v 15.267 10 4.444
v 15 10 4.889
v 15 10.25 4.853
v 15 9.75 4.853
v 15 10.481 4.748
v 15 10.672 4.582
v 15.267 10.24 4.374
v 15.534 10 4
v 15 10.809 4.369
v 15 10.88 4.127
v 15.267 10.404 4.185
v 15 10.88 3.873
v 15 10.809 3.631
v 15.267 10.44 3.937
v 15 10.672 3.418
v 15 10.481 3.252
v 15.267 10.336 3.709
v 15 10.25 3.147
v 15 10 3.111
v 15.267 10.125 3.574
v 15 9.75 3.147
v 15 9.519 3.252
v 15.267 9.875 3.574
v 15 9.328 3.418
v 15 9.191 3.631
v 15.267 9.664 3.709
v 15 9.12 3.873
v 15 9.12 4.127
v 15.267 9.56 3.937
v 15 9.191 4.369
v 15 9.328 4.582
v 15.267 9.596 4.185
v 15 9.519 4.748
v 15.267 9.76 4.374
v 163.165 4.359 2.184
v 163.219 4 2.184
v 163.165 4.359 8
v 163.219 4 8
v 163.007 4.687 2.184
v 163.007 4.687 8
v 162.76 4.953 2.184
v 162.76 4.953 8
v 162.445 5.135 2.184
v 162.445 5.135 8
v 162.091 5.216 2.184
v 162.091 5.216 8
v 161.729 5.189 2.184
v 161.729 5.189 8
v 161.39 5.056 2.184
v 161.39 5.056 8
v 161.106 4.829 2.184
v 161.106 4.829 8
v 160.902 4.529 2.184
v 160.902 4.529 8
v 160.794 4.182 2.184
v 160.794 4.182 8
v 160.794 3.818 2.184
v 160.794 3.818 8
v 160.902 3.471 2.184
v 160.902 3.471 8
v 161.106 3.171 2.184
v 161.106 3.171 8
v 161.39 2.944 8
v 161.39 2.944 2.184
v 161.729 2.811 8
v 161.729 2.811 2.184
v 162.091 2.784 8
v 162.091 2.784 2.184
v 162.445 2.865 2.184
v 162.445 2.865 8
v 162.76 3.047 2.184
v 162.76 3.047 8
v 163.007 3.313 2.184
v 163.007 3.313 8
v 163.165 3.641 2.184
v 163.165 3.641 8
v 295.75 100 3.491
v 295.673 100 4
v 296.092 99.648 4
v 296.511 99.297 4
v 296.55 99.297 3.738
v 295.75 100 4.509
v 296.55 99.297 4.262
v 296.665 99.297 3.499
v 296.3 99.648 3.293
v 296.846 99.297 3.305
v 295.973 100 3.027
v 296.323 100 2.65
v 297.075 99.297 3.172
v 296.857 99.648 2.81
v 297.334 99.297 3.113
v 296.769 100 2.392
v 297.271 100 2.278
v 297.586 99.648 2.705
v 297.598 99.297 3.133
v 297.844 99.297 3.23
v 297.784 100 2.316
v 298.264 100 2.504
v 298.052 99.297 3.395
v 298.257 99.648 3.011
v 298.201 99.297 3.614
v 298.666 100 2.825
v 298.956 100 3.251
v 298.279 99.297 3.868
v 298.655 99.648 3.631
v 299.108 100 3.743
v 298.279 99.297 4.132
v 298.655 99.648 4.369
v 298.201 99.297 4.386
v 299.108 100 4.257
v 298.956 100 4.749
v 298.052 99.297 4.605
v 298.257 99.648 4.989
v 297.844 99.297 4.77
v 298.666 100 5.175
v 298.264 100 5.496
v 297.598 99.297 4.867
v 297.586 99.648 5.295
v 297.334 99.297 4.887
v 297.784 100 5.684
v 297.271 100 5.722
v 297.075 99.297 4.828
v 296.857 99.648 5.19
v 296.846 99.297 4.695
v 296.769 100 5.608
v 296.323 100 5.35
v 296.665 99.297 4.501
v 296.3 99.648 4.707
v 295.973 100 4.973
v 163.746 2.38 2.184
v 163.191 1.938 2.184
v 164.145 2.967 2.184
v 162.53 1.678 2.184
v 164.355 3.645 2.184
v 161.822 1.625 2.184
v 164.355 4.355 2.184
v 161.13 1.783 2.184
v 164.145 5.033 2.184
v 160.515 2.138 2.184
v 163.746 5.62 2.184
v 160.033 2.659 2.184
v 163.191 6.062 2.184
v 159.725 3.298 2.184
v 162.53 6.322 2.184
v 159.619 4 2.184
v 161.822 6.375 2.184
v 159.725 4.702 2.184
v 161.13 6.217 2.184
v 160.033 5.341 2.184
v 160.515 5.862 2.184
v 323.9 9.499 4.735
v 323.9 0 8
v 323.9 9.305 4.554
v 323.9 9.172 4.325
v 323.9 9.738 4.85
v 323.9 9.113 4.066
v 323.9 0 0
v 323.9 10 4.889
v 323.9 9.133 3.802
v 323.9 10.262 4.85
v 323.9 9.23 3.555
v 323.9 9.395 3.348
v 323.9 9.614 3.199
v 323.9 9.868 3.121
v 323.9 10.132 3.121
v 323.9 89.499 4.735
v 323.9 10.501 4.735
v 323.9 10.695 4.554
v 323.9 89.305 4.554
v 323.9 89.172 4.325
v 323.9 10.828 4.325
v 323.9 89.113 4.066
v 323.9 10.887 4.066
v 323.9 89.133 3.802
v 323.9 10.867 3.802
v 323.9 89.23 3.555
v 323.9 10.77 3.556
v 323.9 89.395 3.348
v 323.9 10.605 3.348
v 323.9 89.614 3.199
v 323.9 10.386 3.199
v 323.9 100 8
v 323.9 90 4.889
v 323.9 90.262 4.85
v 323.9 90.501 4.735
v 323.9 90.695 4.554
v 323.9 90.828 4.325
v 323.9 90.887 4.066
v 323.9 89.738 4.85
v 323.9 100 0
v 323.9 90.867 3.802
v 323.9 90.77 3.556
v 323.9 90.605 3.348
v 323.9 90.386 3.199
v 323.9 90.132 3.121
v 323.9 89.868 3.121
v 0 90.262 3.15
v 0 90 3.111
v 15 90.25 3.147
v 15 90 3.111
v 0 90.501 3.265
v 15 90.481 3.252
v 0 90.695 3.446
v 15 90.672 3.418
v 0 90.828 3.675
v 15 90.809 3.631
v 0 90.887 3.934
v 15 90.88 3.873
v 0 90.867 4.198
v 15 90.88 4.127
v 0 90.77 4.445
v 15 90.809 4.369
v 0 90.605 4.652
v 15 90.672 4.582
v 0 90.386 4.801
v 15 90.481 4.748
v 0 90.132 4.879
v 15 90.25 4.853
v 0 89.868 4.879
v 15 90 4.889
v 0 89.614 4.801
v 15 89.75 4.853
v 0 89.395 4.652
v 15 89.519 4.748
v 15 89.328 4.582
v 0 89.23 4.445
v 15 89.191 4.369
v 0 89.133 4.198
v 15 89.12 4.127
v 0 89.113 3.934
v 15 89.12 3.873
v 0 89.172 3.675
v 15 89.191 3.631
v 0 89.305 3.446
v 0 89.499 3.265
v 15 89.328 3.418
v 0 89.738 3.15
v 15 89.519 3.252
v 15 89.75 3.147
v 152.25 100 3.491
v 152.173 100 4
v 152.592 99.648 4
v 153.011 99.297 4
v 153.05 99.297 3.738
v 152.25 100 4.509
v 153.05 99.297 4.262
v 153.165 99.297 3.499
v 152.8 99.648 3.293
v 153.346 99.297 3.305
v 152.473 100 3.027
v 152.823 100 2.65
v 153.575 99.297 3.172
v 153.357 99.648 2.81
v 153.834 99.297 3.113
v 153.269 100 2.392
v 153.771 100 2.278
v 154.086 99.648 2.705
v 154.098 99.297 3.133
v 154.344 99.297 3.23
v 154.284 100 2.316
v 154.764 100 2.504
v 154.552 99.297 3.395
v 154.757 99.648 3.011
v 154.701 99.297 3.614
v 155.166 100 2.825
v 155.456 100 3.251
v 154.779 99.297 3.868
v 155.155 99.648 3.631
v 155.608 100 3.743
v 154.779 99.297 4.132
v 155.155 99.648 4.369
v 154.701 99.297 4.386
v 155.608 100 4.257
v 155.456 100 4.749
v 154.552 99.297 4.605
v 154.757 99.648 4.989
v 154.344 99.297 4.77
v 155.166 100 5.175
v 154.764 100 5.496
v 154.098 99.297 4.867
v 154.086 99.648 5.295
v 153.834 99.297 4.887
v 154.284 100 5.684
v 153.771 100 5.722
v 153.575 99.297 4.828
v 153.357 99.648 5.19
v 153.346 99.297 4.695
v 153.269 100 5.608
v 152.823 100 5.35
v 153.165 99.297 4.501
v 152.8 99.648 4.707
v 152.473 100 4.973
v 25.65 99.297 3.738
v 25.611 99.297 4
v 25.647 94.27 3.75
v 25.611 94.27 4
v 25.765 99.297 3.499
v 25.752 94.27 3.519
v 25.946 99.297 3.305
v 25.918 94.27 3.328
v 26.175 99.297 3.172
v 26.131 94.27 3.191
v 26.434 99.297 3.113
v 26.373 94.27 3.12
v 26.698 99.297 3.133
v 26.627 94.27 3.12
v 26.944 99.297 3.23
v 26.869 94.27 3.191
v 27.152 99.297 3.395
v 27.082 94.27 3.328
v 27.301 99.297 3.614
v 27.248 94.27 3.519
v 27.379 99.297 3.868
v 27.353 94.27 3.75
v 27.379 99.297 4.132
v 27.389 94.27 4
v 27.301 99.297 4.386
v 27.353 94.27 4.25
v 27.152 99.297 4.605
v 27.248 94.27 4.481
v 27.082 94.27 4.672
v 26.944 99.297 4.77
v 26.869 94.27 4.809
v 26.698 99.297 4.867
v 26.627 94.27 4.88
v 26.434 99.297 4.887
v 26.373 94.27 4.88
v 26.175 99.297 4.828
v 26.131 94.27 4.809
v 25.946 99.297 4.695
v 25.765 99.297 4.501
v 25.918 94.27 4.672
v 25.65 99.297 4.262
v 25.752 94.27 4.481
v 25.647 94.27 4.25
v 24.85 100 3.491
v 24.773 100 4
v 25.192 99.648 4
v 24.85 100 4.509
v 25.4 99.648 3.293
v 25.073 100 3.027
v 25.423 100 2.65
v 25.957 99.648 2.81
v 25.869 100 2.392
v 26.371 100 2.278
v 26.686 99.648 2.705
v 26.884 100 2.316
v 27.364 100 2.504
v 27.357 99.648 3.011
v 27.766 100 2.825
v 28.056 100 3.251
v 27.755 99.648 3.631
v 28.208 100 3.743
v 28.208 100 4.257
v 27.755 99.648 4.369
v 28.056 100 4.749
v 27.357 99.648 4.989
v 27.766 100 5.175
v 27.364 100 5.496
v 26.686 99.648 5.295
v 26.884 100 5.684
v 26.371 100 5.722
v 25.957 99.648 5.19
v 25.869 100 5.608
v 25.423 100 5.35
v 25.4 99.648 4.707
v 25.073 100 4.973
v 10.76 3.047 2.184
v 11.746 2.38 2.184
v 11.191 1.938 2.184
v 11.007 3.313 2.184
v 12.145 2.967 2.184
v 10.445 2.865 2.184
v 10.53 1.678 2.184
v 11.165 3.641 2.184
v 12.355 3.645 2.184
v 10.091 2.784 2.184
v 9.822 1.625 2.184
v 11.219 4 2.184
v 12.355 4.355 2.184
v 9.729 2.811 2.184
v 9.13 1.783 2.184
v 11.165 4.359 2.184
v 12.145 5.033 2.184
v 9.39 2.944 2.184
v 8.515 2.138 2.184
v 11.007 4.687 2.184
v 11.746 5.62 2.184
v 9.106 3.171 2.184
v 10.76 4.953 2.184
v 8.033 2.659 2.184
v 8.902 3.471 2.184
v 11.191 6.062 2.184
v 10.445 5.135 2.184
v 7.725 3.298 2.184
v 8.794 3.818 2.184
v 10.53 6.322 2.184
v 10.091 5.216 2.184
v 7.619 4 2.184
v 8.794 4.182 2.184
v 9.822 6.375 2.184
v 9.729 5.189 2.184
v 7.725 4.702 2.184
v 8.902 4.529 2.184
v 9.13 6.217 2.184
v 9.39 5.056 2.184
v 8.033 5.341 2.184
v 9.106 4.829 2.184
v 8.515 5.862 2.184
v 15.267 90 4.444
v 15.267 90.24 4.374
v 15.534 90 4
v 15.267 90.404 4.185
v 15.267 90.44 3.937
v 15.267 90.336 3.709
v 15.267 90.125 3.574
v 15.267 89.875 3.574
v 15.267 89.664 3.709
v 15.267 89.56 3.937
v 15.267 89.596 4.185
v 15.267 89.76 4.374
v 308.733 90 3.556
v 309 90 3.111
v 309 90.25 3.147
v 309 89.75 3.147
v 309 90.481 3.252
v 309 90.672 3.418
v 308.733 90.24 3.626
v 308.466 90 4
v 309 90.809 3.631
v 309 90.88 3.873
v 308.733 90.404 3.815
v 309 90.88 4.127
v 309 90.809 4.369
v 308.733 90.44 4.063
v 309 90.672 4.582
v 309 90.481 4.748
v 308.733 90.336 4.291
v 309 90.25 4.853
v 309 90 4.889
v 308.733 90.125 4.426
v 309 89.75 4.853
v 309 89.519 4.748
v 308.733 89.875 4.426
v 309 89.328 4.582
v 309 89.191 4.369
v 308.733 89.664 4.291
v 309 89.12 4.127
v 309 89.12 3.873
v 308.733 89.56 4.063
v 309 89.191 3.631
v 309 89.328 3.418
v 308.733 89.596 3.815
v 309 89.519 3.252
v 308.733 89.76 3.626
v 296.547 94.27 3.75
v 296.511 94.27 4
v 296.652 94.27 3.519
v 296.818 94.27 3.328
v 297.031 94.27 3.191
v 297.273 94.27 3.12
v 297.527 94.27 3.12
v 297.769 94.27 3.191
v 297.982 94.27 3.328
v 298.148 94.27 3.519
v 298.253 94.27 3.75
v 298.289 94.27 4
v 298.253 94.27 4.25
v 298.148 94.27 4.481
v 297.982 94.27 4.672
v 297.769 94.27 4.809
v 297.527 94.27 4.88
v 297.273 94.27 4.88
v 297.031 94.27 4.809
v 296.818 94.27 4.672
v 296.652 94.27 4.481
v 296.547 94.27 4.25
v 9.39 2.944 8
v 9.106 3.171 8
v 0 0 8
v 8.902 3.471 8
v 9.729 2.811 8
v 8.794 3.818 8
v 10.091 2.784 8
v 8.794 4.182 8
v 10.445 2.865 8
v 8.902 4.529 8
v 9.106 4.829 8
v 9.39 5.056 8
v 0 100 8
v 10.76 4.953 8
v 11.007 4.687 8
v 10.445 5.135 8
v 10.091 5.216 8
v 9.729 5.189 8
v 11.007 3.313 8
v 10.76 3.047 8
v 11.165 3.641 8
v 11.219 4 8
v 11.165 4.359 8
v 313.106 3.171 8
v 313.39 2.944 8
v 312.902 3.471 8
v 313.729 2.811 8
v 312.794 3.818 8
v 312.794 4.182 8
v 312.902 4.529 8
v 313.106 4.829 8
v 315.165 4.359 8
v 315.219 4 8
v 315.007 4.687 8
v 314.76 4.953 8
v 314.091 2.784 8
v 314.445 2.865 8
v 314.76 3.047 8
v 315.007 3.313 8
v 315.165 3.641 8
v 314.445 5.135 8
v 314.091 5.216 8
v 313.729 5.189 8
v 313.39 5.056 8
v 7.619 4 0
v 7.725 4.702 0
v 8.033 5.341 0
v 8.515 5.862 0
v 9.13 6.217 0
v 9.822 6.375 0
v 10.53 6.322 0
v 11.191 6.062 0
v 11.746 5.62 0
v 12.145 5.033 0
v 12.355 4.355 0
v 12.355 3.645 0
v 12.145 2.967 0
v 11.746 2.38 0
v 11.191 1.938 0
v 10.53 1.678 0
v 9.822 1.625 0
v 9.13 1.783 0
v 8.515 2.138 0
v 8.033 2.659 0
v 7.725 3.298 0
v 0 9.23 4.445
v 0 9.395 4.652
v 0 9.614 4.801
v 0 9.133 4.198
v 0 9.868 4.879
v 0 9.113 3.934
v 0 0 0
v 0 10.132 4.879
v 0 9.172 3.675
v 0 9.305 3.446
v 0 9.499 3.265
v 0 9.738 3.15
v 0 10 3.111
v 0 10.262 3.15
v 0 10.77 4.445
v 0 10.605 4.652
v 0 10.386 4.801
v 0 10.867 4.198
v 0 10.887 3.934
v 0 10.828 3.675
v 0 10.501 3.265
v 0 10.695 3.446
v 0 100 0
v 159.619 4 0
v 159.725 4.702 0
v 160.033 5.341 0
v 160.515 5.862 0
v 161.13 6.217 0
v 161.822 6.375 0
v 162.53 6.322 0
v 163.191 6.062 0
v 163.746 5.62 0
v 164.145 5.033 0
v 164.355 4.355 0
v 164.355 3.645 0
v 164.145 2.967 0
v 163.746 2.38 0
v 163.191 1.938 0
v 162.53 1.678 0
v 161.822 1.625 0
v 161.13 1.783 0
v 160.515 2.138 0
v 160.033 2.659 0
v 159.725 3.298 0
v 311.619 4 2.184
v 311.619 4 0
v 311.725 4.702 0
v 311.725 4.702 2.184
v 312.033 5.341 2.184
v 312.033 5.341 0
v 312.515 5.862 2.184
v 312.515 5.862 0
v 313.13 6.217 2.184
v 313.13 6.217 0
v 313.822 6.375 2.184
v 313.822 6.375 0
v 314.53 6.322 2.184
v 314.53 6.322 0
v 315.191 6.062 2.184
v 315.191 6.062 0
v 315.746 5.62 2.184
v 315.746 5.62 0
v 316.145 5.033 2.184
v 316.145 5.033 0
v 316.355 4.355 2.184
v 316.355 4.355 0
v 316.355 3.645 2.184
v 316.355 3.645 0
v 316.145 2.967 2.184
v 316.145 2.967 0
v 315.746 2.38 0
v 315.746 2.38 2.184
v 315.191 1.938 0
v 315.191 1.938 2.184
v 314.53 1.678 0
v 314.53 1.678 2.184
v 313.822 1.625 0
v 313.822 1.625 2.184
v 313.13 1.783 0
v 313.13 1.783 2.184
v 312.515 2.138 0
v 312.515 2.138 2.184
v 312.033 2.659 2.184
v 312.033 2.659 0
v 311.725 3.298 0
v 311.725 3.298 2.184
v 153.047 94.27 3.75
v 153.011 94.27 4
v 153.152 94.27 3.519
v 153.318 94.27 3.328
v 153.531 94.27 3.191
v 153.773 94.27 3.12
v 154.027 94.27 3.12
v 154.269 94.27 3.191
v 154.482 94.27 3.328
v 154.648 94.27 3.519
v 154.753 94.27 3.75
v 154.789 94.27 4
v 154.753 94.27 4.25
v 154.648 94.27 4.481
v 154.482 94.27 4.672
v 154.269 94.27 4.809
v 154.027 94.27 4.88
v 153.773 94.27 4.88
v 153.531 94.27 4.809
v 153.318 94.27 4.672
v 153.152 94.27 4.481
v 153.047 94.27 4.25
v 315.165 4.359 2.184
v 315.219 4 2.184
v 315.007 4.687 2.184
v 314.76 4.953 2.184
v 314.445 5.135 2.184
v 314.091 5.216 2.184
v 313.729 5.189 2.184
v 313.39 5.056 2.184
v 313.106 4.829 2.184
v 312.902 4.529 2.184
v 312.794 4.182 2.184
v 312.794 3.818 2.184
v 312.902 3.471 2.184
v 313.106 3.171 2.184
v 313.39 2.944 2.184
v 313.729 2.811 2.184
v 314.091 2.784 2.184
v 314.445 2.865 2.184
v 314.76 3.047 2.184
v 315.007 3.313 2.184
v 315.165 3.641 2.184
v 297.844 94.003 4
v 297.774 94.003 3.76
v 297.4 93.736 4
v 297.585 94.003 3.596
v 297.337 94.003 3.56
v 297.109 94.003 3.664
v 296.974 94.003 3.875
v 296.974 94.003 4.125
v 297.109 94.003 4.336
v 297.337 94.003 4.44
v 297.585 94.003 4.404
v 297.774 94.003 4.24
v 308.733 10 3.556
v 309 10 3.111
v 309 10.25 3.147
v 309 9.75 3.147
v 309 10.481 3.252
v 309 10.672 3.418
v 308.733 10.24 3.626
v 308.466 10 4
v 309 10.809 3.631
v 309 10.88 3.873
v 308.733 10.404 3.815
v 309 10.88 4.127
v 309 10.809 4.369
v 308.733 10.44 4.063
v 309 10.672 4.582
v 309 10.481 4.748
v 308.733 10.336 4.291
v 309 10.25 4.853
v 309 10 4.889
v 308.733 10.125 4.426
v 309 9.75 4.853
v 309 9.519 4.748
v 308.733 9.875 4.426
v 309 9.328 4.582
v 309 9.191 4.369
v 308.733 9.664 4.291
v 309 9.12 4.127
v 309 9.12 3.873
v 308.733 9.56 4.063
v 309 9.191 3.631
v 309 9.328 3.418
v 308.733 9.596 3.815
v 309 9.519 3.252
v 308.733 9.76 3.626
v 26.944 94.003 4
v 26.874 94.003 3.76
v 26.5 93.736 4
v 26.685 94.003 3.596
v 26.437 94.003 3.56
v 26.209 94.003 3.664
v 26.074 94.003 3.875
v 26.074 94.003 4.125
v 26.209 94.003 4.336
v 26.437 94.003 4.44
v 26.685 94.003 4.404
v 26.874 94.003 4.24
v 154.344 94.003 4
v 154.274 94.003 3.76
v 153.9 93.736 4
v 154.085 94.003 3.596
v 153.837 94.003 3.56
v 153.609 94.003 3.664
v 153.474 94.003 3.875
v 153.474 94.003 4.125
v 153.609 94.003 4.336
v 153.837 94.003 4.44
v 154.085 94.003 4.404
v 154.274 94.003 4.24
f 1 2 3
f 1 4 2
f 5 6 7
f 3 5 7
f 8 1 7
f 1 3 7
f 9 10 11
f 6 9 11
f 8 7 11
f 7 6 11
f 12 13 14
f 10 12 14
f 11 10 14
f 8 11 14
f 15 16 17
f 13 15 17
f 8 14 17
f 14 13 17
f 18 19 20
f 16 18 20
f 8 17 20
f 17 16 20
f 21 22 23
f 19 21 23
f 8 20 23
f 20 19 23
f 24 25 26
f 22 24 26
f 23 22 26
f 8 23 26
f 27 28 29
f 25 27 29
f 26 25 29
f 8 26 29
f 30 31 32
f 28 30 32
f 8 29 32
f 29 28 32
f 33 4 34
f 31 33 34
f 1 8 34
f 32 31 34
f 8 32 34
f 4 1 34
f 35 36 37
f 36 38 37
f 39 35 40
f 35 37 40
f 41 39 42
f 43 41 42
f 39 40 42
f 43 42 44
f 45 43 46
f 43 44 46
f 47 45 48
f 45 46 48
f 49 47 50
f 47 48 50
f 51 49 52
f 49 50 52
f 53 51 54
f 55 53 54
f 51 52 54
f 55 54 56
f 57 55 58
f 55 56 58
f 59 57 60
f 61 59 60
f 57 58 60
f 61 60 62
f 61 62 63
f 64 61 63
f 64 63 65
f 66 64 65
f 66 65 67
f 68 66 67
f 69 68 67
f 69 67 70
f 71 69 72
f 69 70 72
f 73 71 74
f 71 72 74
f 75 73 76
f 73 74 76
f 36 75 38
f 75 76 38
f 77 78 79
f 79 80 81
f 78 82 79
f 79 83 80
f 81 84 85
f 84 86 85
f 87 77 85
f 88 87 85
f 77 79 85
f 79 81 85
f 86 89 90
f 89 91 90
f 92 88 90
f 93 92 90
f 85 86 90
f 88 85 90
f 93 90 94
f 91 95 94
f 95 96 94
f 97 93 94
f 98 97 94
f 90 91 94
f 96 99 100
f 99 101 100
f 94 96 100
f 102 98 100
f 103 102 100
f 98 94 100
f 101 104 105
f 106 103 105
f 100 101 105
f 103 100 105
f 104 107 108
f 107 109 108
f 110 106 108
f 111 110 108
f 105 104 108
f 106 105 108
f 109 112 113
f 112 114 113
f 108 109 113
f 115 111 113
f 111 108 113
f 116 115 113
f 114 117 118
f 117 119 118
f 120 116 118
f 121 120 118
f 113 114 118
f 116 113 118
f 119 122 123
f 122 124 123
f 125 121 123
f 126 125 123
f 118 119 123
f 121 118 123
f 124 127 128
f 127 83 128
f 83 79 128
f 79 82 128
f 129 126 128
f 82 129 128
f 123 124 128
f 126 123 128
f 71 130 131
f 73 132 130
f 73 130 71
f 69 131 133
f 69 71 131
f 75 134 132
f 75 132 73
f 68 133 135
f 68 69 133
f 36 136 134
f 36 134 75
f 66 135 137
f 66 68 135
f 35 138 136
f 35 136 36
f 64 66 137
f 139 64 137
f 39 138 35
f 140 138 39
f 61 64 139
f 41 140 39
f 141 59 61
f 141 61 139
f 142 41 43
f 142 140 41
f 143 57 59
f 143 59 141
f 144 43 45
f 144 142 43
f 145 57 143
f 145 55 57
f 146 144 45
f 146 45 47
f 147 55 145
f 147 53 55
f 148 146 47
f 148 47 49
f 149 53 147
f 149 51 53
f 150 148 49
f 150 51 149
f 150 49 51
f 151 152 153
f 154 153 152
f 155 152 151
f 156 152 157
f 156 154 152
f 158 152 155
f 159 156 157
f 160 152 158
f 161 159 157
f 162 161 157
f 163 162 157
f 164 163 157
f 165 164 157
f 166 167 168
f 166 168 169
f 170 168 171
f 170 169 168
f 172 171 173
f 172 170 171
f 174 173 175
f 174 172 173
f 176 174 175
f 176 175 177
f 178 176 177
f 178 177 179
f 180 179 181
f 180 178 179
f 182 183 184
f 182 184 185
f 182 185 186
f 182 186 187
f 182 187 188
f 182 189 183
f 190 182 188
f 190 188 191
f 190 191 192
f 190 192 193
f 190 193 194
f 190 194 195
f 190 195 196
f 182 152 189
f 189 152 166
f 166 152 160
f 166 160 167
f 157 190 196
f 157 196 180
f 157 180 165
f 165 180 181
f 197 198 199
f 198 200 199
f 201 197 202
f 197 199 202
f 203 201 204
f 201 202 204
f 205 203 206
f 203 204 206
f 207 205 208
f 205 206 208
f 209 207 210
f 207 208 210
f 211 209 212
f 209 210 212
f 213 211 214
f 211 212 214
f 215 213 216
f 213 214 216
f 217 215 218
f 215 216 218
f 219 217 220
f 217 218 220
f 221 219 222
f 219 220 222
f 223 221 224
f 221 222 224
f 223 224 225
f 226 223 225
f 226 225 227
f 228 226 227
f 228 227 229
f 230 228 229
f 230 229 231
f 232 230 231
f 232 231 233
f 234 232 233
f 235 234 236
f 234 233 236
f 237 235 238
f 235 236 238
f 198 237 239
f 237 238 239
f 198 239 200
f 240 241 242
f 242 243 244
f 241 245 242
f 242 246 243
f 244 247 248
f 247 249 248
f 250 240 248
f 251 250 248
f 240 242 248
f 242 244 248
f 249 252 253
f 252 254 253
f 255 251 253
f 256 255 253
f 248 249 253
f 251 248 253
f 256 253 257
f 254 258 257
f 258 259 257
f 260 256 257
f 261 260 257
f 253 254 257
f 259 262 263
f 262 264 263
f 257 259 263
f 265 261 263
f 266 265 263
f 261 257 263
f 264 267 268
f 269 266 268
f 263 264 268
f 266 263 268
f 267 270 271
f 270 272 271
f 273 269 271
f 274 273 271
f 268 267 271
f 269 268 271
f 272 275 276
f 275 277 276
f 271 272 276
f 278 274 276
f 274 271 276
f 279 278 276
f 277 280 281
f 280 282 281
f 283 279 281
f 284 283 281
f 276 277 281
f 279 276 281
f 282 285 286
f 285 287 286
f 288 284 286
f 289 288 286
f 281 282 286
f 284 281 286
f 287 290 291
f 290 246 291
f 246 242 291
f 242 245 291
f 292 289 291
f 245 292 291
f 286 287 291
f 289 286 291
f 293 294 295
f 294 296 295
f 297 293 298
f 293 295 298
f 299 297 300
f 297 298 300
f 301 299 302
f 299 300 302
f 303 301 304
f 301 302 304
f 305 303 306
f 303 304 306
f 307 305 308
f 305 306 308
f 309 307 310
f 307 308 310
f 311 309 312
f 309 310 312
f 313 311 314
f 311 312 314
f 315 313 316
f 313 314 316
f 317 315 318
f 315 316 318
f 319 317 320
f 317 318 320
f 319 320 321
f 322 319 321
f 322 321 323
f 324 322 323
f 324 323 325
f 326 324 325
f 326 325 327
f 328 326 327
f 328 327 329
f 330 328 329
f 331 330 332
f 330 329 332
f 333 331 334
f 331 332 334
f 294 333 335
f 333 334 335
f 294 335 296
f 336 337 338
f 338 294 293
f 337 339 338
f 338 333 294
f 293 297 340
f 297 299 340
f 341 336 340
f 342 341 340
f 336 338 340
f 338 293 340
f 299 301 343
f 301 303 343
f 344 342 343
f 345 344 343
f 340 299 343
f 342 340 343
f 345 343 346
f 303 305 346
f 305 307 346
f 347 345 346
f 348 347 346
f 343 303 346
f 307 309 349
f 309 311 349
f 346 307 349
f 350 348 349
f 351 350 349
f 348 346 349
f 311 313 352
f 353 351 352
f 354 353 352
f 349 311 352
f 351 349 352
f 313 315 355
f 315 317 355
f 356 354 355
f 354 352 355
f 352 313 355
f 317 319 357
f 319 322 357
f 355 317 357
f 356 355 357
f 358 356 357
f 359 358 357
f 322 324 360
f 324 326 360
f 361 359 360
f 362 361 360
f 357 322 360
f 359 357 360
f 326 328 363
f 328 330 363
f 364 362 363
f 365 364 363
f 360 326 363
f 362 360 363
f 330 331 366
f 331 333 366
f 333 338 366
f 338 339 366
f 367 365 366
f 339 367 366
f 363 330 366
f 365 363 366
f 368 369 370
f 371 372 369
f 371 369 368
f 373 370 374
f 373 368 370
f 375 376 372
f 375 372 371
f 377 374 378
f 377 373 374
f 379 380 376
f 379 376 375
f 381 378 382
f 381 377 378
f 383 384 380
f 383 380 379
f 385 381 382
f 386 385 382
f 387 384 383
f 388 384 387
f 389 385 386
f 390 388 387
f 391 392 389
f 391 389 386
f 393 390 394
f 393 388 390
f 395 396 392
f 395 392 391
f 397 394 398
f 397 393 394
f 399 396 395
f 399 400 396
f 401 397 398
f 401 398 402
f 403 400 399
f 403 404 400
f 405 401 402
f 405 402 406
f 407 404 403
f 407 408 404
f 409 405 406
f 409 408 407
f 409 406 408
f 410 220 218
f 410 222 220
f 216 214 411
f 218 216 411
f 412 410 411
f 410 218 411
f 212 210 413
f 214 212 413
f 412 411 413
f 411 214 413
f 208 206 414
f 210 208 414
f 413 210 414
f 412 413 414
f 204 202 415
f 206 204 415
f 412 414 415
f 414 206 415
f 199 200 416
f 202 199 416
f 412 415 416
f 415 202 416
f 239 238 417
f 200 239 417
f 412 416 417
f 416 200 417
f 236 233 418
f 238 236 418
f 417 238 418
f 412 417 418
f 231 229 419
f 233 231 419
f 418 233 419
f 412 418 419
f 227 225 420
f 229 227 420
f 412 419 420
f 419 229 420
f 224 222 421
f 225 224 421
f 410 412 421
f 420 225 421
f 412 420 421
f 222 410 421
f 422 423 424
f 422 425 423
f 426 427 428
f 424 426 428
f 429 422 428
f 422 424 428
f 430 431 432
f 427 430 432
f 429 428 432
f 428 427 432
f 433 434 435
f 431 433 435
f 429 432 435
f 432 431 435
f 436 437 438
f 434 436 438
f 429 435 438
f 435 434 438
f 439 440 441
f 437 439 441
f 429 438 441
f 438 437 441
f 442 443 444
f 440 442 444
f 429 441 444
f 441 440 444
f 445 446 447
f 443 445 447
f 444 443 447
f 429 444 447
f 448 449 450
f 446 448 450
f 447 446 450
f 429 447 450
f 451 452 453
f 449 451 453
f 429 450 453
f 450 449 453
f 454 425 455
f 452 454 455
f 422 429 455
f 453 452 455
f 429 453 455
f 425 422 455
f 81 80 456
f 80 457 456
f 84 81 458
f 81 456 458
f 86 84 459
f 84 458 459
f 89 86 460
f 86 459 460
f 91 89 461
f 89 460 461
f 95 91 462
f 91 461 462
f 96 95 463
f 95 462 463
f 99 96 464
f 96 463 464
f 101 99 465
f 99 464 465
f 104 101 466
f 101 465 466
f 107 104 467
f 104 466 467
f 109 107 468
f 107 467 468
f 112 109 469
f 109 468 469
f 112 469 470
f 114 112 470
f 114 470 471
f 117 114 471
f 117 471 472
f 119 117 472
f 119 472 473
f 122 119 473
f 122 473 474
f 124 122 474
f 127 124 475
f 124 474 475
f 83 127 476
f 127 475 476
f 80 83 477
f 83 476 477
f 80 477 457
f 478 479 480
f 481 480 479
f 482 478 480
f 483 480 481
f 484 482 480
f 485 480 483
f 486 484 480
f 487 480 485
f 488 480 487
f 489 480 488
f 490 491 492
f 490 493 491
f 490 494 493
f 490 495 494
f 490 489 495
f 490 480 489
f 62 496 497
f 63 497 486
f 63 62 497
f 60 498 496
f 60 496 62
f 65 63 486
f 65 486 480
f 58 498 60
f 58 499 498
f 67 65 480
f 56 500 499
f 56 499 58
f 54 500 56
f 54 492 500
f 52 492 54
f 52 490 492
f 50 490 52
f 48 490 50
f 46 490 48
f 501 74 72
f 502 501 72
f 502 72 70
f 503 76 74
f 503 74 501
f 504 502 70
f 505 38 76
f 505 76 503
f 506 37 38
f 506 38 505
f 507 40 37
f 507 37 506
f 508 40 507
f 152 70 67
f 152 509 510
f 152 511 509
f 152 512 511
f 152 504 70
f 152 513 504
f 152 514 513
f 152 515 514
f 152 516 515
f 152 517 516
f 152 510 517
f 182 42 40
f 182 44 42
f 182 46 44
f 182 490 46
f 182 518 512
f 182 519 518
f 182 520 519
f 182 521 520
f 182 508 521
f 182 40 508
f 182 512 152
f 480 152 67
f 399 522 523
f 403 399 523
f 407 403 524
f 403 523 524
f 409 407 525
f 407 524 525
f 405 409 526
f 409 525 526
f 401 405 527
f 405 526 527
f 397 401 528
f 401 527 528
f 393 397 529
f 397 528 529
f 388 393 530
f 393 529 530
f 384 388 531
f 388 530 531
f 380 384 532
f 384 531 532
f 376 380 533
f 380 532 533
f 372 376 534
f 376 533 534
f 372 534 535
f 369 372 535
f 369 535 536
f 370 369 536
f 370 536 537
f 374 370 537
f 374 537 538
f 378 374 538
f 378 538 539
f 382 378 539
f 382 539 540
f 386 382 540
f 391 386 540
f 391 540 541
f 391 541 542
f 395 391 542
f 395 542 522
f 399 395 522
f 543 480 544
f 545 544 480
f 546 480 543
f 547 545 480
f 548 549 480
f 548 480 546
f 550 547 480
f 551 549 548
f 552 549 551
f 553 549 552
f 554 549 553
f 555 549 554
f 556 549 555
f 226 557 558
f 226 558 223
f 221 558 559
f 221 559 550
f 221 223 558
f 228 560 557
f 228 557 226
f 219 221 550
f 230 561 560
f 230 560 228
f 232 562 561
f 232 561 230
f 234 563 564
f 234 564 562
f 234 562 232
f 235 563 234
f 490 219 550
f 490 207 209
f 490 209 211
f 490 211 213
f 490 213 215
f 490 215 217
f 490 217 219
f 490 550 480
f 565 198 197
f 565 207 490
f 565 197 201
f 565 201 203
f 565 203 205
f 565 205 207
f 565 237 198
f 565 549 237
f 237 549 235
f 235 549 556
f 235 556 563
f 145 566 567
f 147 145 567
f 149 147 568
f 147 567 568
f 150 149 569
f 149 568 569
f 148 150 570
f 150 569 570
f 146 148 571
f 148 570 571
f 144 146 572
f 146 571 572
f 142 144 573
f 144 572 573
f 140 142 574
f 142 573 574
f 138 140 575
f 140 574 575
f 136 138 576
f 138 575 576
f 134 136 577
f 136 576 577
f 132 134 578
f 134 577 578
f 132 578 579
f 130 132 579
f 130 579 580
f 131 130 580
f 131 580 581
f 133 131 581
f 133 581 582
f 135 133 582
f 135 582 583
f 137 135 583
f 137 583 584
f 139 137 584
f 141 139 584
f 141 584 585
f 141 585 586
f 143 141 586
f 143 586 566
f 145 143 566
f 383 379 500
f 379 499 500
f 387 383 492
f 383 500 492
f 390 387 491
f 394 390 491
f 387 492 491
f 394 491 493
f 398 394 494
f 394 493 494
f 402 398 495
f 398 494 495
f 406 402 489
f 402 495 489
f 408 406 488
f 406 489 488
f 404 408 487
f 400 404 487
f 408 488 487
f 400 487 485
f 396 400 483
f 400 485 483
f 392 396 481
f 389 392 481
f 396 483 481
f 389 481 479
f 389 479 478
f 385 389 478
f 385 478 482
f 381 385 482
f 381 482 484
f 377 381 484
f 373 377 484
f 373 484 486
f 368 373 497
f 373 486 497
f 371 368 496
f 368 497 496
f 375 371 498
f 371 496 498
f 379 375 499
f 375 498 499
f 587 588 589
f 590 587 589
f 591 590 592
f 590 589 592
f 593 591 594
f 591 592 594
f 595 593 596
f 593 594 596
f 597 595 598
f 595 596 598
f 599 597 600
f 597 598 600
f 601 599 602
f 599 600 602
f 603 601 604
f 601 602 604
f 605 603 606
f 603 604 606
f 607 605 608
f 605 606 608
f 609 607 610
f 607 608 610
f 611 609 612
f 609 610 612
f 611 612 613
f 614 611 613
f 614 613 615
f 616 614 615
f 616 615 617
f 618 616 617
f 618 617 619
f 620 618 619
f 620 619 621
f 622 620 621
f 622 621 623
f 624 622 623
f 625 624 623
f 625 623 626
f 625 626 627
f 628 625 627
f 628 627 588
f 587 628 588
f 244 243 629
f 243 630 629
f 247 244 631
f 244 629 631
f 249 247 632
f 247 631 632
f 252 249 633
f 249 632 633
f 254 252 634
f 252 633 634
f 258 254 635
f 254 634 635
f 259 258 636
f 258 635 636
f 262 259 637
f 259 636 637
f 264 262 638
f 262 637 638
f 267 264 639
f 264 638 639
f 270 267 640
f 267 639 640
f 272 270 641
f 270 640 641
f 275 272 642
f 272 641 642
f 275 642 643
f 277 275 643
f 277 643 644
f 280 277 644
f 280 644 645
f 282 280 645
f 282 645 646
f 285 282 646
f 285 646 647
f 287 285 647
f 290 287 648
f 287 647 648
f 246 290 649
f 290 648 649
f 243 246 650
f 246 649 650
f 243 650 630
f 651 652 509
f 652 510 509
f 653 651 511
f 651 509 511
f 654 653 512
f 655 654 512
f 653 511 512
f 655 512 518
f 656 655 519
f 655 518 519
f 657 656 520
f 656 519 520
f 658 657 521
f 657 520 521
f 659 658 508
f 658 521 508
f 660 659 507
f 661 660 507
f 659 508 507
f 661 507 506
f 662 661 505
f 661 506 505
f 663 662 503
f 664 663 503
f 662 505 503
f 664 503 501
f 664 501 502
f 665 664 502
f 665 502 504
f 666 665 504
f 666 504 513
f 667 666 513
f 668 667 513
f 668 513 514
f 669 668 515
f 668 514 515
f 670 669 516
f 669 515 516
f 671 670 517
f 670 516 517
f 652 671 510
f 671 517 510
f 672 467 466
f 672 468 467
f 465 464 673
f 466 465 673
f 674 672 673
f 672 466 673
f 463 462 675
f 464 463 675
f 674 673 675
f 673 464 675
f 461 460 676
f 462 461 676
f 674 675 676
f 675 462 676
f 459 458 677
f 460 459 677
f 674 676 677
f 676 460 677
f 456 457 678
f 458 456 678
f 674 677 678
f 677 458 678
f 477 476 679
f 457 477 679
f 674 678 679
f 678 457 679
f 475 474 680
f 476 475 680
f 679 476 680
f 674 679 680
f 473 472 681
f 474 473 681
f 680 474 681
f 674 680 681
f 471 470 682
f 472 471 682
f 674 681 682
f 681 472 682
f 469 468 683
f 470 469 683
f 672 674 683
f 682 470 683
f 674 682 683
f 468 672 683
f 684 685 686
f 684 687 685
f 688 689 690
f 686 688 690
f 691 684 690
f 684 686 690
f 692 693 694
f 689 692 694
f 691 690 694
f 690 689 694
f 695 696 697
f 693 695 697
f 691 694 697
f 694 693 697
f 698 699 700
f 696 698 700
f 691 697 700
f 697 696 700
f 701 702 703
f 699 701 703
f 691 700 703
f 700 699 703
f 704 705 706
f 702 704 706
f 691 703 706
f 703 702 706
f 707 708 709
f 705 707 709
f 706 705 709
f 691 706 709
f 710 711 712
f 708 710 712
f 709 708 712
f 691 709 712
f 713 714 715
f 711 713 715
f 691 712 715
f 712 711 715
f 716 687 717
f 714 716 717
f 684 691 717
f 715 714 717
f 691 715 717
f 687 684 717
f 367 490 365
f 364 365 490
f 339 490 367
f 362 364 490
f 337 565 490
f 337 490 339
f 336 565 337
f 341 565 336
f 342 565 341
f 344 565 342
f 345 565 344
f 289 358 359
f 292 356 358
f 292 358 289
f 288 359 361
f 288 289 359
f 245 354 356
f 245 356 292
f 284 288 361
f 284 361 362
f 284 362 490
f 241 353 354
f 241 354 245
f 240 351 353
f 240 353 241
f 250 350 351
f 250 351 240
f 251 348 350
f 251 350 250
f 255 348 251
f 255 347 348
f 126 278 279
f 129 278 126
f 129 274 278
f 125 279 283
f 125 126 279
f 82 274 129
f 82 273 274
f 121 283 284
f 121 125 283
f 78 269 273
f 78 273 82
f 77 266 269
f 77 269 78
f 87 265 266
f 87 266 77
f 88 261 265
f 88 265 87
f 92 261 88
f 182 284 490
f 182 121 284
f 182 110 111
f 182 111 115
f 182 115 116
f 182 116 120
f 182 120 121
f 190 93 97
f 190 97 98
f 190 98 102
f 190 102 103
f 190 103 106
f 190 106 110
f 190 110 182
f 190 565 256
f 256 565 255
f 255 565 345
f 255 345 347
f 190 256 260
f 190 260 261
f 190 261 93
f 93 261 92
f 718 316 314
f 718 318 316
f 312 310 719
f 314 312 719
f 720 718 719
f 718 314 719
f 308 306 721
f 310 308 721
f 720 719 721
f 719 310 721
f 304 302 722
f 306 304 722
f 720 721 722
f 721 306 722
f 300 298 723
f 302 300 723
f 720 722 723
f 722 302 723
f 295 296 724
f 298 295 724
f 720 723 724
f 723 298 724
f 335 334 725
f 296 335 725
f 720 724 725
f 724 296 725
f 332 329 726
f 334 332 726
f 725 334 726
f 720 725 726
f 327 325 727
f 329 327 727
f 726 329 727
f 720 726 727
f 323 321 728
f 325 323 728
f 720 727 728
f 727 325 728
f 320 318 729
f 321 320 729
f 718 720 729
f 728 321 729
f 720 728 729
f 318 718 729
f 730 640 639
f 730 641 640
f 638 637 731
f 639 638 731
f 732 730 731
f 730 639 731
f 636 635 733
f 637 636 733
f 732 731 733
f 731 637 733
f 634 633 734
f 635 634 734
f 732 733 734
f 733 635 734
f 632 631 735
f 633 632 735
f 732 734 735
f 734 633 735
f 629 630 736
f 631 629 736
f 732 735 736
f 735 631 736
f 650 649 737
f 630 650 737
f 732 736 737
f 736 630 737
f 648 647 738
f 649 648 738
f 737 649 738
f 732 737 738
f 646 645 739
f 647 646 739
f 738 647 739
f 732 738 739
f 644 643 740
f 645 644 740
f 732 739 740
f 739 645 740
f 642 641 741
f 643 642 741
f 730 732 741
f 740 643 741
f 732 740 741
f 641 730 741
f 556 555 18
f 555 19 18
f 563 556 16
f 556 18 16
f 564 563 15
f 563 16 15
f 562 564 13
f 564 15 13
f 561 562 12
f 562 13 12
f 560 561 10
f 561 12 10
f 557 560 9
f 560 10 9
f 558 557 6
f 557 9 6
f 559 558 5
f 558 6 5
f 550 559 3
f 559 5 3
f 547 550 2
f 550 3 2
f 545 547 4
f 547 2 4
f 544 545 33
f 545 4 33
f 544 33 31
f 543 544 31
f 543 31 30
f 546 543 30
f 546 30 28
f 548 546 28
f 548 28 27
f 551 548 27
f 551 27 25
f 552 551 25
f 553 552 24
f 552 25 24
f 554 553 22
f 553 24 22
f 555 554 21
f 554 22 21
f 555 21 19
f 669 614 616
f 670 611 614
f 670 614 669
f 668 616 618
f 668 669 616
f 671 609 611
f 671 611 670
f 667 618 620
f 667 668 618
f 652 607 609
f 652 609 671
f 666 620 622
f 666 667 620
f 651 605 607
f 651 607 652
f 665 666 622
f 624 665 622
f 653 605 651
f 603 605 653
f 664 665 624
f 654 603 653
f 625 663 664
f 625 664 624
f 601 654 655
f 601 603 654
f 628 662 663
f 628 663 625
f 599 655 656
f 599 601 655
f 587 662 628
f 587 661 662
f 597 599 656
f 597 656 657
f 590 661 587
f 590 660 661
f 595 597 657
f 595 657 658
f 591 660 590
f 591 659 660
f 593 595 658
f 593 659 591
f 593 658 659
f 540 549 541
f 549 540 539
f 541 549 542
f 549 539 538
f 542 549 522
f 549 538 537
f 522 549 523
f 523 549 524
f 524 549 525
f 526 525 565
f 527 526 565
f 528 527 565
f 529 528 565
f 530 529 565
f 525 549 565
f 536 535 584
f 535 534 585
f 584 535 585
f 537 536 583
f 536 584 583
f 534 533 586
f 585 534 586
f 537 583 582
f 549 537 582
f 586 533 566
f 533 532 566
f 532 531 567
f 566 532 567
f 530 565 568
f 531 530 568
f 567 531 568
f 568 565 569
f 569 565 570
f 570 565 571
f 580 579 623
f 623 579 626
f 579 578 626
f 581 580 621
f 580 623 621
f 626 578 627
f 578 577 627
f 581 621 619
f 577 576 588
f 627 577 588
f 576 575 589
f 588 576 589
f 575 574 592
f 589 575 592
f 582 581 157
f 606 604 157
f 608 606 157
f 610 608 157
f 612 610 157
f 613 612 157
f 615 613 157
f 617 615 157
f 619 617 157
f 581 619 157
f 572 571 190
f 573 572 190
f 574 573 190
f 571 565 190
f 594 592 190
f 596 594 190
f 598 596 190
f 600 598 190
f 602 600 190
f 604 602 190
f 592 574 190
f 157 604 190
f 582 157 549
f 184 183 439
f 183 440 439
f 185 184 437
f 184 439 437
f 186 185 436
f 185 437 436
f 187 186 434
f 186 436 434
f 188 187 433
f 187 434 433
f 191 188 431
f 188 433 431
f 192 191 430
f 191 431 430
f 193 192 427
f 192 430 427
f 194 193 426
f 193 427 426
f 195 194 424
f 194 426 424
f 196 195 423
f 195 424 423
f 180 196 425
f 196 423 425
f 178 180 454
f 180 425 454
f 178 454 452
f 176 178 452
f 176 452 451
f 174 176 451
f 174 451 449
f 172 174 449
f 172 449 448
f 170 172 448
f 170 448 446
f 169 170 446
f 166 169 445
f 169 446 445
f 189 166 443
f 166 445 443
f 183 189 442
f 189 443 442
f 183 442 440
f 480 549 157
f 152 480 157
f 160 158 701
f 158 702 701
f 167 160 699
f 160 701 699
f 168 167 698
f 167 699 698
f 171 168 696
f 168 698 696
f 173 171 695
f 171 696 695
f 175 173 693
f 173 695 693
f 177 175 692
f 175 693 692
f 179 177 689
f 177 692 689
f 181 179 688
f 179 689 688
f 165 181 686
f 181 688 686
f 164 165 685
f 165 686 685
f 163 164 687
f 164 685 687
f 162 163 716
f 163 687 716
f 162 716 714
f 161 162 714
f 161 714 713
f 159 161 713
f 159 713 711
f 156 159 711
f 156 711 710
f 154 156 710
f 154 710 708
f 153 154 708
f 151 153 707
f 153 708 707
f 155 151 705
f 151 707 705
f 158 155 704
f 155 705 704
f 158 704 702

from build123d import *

# Parameters (mm, degrees)
SKETCH1_W                                      = 324
SKETCH1_H                                      = 100
BOSS_EXTRUDE1_DEPTH                            = 8
CBORE_FOR_2_SOCKET_HEAD_CAP_SCREW1_D           = 2.4384
CBORE_FOR_2_SOCKET_HEAD_CAP_SCREW1_CBORE_D     = 4.7625
CBORE_FOR_2_SOCKET_HEAD_CAP_SCREW1_CBORE_DEPTH = 2.1844
F_2_56_TAPPED_HOLE1_D                          = 1.778
F_2_56_TAPPED_HOLE1_DEPTH                      = 15
F_2_56_TAPPED_HOLE1_TIP                        = 0.53416509
F_2_56_TAPPED_HOLE2_D                          = 1.778
F_2_56_TAPPED_HOLE2_DEPTH                      = 15
F_2_56_TAPPED_HOLE2_TIP                        = 0.53416509
SKETCH10_W                                     = 8
SKETCH10_H                                     = 100
CUT_EXTRUDE1_DEPTH                             = 0.1
F_2_56_TAPPED_HOLE3_D                          = 1.778
F_2_56_TAPPED_HOLE3_DEPTH                      = 5.73
F_2_56_TAPPED_HOLE3_CSINK_D                    = 3.4544
F_2_56_TAPPED_HOLE3_CSINK_ANGLE                = 100
F_2_56_TAPPED_HOLE3_TIP                        = 0.53416509


with BuildPart() as part:
    # Sketch1 → Boss-Extrude1 (new body)
    with BuildSketch(Plane.XY):
        with Locations((162, 50)):
            Rectangle(SKETCH1_W, SKETCH1_H)
    extrude(amount=BOSS_EXTRUDE1_DEPTH)

    # CBORE for #2 Socket Head Cap Screw1 (through all)
    with Locations(Plane(origin=(0, 0, 0), x_dir=(-1, 0, 0), z_dir=(0, 0, -1))):
        with Locations((-314, 4), (-10, 4), (-162, 4)):
            CounterBoreHole(CBORE_FOR_2_SOCKET_HEAD_CAP_SCREW1_D / 2, CBORE_FOR_2_SOCKET_HEAD_CAP_SCREW1_CBORE_D / 2, CBORE_FOR_2_SOCKET_HEAD_CAP_SCREW1_CBORE_DEPTH)

    # #2-56 Tapped Hole1
    with Locations(Plane(origin=(324, 0, 0), x_dir=(0, 0, -1), z_dir=(1, 0, 0))):
        with Locations((-4, 90), (-4, 10)):
            Hole(F_2_56_TAPPED_HOLE1_D / 2, depth=F_2_56_TAPPED_HOLE1_DEPTH)
            with Locations((0, 0, -(F_2_56_TAPPED_HOLE1_DEPTH + F_2_56_TAPPED_HOLE1_TIP / 2))):  # 118° drill point
                Cone(0, F_2_56_TAPPED_HOLE1_D / 2, F_2_56_TAPPED_HOLE1_TIP, mode=Mode.SUBTRACT)

    # #2-56 Tapped Hole2
    with Locations(Plane.ZY):
        with Locations((4, 90), (4, 10)):
            Hole(F_2_56_TAPPED_HOLE2_D / 2, depth=F_2_56_TAPPED_HOLE2_DEPTH)
            with Locations((0, 0, -(F_2_56_TAPPED_HOLE2_DEPTH + F_2_56_TAPPED_HOLE2_TIP / 2))):  # 118° drill point
                Cone(0, F_2_56_TAPPED_HOLE2_D / 2, F_2_56_TAPPED_HOLE2_TIP, mode=Mode.SUBTRACT)

    # Sketch10 → Cut-Extrude1 (cut)
    with BuildSketch(Plane(origin=(324, 0, 0), x_dir=(0, 0, -1), z_dir=(1, 0, 0))):
        with Locations((-4, 50)):
            Rectangle(SKETCH10_W, SKETCH10_H)
    extrude(amount=-CUT_EXTRUDE1_DEPTH, mode=Mode.SUBTRACT)

    # #2-56 Tapped Hole3
    with Locations(Plane(origin=(0, 100, 0), x_dir=(1, 0, 0), z_dir=(0, 1, 0))):
        with Locations((297.4, -4), (153.9, -4), (26.5, -4)):
            CounterSinkHole(F_2_56_TAPPED_HOLE3_D / 2, F_2_56_TAPPED_HOLE3_CSINK_D / 2, depth=F_2_56_TAPPED_HOLE3_DEPTH, counter_sink_angle=F_2_56_TAPPED_HOLE3_CSINK_ANGLE)
            with Locations((0, 0, -(F_2_56_TAPPED_HOLE3_DEPTH + F_2_56_TAPPED_HOLE3_TIP / 2))):  # 118° drill point
                Cone(0, F_2_56_TAPPED_HOLE3_D / 2, F_2_56_TAPPED_HOLE3_TIP, mode=Mode.SUBTRACT)


solid = part.part
